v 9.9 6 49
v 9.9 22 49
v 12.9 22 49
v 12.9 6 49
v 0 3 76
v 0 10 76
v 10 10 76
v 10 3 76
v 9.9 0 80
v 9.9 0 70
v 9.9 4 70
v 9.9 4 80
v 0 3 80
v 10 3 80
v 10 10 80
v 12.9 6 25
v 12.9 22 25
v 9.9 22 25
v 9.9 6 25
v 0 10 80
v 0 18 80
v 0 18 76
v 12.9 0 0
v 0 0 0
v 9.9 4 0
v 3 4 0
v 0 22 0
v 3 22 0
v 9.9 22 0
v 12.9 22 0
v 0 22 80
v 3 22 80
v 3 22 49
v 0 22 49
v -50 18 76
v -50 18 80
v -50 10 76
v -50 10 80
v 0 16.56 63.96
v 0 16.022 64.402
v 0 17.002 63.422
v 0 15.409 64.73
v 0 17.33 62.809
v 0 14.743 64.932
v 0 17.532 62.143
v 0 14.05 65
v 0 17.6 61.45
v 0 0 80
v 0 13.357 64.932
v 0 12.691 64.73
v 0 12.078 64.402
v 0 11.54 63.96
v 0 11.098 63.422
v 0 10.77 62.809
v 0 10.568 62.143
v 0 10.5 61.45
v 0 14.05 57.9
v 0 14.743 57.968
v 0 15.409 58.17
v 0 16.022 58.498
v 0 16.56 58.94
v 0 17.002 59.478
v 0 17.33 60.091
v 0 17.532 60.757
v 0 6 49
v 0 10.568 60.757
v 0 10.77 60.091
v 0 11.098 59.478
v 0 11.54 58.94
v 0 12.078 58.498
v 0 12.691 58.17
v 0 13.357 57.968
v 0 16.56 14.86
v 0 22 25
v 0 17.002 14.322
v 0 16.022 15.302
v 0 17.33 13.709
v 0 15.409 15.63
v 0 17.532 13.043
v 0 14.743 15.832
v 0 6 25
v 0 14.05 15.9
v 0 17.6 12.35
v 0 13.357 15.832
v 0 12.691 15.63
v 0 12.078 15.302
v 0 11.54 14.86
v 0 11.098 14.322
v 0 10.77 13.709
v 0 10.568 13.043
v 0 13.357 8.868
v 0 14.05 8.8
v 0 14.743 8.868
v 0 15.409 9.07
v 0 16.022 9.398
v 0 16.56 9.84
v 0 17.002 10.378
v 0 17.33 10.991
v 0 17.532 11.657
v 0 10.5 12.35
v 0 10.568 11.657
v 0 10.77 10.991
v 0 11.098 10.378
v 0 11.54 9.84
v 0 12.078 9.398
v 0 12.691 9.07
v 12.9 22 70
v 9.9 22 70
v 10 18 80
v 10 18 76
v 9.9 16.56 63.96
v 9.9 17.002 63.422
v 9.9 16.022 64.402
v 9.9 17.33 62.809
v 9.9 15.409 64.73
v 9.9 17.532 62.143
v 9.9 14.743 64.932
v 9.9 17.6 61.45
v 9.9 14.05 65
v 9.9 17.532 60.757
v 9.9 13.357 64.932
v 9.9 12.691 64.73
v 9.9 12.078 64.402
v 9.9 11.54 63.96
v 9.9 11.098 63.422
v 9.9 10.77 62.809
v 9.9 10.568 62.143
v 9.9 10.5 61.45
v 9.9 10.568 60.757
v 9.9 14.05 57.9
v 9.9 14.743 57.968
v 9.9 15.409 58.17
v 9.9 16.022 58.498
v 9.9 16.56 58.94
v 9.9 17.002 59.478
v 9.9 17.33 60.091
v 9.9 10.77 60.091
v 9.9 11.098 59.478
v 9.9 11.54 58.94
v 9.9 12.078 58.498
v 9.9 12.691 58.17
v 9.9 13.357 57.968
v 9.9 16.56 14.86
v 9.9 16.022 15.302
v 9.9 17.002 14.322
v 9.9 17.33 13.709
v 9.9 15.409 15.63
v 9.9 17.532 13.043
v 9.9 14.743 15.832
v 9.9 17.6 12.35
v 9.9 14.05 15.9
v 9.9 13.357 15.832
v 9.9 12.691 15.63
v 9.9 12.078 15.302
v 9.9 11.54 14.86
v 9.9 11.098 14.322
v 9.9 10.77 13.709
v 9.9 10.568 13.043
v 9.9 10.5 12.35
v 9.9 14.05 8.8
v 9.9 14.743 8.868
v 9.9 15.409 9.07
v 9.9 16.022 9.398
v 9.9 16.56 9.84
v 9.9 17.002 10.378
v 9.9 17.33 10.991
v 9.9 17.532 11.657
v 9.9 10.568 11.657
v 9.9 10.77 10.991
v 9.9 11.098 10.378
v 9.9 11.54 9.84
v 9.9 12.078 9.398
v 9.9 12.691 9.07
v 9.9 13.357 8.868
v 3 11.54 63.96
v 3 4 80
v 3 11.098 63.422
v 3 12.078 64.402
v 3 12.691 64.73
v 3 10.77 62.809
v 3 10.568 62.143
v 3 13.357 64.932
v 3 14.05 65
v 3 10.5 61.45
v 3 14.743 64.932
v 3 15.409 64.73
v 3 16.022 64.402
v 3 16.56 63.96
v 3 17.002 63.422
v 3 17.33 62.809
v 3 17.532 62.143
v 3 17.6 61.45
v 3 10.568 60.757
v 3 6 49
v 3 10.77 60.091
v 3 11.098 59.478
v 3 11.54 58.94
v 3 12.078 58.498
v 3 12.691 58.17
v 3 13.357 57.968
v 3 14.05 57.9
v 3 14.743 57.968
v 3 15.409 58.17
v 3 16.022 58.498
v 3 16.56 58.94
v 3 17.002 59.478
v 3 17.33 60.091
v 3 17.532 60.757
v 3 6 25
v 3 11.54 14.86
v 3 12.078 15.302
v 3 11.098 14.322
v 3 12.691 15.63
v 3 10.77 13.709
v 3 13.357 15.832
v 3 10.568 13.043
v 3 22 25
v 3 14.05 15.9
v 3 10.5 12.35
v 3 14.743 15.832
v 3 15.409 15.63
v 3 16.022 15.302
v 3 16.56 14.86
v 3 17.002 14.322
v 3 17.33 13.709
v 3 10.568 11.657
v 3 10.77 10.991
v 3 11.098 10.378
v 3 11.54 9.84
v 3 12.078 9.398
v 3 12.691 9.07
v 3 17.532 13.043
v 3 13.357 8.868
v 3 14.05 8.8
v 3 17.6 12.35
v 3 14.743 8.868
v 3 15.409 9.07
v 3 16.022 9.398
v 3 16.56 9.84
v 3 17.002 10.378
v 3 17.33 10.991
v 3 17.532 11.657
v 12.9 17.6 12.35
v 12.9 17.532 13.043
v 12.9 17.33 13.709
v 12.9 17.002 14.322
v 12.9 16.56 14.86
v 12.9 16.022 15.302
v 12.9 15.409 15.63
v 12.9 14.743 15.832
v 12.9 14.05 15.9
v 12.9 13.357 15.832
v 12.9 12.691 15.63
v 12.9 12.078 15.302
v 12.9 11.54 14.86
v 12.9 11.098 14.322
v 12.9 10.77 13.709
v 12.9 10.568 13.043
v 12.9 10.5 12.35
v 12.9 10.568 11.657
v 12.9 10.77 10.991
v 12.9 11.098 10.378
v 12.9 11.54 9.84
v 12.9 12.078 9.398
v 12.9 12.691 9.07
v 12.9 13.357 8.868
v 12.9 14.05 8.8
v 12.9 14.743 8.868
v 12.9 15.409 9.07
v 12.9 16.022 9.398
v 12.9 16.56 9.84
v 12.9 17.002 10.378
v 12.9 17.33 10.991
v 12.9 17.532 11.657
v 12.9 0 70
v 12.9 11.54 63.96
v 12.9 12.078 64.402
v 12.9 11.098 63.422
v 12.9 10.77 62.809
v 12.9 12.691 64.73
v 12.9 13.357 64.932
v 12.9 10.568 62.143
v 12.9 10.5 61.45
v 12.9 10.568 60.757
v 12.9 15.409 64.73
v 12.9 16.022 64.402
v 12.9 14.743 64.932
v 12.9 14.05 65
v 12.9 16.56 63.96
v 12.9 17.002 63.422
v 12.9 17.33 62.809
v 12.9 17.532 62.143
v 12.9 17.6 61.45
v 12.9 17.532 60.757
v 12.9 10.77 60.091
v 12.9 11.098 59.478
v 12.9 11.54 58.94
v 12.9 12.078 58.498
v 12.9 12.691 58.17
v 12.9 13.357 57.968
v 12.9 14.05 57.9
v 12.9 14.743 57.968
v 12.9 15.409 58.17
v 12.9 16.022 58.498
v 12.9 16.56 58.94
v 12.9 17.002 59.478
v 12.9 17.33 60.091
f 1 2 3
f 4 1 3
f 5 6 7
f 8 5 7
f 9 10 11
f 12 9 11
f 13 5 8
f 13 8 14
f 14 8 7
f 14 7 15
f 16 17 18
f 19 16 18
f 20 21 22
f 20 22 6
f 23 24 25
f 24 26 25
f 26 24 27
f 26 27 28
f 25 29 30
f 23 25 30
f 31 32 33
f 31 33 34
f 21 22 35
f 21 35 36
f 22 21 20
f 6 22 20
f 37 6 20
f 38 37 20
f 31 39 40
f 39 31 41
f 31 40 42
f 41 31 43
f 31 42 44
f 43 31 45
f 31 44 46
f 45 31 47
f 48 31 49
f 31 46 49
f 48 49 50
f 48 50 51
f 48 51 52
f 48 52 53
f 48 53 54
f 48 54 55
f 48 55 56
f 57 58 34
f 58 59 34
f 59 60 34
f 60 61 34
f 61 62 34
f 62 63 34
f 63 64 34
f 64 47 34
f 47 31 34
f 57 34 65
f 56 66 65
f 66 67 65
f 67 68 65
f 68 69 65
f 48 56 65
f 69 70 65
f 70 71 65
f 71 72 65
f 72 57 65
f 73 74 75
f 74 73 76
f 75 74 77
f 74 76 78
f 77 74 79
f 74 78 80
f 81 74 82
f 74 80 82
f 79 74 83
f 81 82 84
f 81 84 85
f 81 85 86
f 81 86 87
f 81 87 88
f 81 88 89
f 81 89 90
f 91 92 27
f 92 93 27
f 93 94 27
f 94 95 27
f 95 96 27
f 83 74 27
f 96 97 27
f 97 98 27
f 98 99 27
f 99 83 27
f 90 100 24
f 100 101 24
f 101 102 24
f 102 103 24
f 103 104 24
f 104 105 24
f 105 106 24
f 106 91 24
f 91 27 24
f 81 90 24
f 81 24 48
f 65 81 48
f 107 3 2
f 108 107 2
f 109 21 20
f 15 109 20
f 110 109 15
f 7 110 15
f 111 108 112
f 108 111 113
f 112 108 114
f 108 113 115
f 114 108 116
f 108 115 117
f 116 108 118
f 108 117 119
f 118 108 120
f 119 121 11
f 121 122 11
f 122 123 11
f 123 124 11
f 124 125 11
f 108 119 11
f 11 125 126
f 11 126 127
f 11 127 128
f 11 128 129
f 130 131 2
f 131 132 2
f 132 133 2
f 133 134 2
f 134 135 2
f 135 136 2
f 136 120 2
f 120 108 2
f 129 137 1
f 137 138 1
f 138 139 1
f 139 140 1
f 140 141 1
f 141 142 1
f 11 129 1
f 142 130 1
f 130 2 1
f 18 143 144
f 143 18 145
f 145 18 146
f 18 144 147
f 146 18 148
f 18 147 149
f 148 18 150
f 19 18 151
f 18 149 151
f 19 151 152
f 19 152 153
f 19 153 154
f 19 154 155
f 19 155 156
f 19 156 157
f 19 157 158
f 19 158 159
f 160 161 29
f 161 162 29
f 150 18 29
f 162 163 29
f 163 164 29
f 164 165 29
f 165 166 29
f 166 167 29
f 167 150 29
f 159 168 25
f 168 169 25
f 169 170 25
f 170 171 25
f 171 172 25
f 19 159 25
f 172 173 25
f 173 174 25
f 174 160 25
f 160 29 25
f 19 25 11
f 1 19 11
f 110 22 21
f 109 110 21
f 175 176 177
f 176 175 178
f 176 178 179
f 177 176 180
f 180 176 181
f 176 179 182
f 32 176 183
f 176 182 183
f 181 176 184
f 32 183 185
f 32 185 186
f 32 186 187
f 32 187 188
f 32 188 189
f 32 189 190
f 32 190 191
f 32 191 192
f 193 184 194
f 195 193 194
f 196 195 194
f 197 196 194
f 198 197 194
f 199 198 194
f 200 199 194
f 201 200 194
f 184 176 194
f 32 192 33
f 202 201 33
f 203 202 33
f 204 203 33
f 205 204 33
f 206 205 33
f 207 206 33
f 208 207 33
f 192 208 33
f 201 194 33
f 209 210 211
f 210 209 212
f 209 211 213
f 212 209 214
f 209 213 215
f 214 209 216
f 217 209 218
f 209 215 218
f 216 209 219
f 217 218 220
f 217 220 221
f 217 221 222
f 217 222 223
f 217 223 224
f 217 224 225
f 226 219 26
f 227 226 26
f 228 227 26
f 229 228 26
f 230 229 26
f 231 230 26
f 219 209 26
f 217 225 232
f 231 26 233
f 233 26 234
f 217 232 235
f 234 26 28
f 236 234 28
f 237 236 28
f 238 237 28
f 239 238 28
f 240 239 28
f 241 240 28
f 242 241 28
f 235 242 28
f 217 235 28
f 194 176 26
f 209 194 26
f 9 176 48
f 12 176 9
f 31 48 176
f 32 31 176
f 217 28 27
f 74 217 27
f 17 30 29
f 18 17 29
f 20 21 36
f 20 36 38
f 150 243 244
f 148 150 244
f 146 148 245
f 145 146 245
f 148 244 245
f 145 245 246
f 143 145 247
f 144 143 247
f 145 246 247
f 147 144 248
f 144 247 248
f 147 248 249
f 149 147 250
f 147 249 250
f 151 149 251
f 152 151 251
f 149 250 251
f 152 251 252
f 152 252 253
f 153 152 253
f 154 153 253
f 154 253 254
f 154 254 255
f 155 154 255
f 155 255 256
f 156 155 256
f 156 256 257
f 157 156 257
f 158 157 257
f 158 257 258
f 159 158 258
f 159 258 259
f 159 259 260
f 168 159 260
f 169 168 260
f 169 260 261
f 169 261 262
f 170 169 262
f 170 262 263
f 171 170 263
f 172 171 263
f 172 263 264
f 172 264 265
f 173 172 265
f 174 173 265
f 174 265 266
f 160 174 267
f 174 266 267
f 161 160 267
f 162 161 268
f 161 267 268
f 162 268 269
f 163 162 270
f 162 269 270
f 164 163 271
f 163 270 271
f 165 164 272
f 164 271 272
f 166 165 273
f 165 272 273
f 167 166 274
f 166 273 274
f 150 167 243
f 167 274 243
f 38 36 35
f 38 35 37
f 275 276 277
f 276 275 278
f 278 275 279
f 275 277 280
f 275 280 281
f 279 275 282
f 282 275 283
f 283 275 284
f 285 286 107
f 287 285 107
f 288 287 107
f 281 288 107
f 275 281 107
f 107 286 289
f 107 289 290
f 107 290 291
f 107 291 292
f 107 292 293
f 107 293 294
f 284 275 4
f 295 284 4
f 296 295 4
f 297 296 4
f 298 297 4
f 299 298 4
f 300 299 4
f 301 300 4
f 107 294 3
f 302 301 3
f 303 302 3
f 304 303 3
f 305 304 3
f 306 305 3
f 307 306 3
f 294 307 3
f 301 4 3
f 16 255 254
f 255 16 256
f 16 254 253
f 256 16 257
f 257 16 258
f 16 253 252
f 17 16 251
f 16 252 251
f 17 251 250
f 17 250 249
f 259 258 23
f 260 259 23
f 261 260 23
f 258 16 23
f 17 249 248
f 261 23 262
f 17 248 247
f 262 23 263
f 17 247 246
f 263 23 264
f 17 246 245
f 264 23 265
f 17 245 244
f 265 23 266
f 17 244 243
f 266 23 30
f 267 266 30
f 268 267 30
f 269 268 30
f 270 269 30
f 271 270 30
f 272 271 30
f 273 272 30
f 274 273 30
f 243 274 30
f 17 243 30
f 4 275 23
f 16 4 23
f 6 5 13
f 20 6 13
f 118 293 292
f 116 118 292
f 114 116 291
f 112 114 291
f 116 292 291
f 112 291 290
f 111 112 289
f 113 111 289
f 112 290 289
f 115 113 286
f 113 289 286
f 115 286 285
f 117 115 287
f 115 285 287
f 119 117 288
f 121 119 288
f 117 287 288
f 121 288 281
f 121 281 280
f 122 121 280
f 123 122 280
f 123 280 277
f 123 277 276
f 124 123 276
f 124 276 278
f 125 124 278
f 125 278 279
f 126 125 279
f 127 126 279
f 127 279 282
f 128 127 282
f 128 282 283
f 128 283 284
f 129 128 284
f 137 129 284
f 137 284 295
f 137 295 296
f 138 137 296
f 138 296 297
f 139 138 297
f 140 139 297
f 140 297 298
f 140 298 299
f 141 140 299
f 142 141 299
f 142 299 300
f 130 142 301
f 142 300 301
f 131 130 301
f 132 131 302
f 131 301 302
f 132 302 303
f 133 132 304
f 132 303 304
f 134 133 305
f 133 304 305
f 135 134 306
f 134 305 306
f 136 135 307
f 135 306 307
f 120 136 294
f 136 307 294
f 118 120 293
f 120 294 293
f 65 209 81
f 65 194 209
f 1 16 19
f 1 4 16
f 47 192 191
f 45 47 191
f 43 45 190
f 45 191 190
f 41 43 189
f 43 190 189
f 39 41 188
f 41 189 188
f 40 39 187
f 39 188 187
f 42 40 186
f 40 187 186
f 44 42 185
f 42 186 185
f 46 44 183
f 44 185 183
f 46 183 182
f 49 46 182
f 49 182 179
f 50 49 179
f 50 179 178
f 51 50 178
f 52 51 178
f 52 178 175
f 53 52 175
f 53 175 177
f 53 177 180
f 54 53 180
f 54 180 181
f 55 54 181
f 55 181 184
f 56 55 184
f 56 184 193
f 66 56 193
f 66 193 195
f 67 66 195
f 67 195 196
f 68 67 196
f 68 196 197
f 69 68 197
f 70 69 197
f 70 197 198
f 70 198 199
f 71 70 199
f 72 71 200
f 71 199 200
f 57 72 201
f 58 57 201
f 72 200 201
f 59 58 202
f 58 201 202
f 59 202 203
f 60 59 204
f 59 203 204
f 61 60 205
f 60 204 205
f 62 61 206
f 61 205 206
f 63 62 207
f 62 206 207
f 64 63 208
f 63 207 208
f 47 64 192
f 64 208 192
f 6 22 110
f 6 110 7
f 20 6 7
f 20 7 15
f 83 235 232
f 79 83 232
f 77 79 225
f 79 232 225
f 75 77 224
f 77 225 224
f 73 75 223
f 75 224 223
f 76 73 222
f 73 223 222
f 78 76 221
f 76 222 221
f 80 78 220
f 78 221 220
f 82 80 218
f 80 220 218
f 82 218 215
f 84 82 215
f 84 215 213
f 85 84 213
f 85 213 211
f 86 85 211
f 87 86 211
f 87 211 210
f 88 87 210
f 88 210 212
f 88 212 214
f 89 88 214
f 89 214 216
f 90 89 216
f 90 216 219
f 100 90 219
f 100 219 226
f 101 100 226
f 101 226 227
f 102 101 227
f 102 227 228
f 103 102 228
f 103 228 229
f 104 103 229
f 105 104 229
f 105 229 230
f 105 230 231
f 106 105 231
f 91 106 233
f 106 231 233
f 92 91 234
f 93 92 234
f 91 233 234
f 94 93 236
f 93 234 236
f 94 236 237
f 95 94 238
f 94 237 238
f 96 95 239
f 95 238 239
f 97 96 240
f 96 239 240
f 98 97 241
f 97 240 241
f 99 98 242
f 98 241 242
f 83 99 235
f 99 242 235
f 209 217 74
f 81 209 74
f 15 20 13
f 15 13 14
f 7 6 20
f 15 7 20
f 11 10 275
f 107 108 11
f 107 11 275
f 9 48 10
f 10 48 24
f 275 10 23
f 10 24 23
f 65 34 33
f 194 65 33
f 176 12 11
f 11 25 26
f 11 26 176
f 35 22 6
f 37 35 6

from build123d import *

# Parameters (mm, degrees)
F1_DEPTH  = 70
F2_R      = 3.55
F3_DEPTH  = 12.901
F5_DEPTH  = 10
F6_W      = 8
F6_H      = 4
F7_DEPTH  = 50
F8_W      = 9.9
F8_H      = 24
F8_W_2    = 3
F9_DEPTH  = 16
F10_DEPTH = 10
F11_DEPTH = 7


# Not quite as in the source:
# - a feature names something its author has since deleted; it is built from what else it names


with BuildPart() as f1:
    # F0 (on Top) → F1 (new body)
    with BuildSketch(Plane.XY):
        Polygon((0, 22), (0, 0), (12.9, 0), (12.9, 22), (9.9, 22), (9.9, 4), (3, 4), (3, 22), align=None)
    extrude(amount=F1_DEPTH)

    # F2 (on face) → F3 (cut, through all)
    with BuildSketch(Plane.YZ.offset(12.9)):
        with Locations((14.05, 61.45)):
            Circle(F2_R)
        with Locations((14.05, 12.35)):
            Circle(F2_R)
    extrude(amount=-F3_DEPTH, mode=Mode.SUBTRACT)

    # F4 (on face) → F5 (join)
    with BuildSketch(Plane.XY.offset(70)):
        Polygon((9.9, 0), (9.9, 4), (3, 4), (3, 22), (0, 22), (0, 0), align=None)
    extrude(amount=F5_DEPTH)

    # F8 (on face) → F9 (cut)
    with BuildSketch(Plane(origin=(0, 22, 0), x_dir=(-1, 0, 0), z_dir=(0, 1, 0))):
        with Locations((-4.95, 37)):
            Rectangle(F8_W, F8_H)
        with Locations((-11.4, 37)):
            Rectangle(F8_W_2, F8_H)
    extrude(amount=-F9_DEPTH, mode=Mode.SUBTRACT)


with BuildPart() as f7:
    # F6 (on face) → F7 (new body)
    with BuildSketch(Plane(origin=(0, 0, 0), x_dir=(0, -1, 0), z_dir=(-1, 0, 0))):
        with Locations((-14, 78)):
            Rectangle(F6_W, F6_H)
    extrude(amount=F7_DEPTH)


with BuildPart() as f10:
    # F6 (on face) → F10 (new body)
    with BuildSketch(Plane(origin=(0, 0, 0), x_dir=(0, -1, 0), z_dir=(-1, 0, 0))):
        with Locations((-14, 78)):
            Rectangle(F6_W, F6_H)
    extrude(amount=-F10_DEPTH)


with BuildPart() as f11:
    # F11 (new): a face of the model
    f11_faces = [f10.part.faces().sort_by_distance(p)[0] for p in [
        (5, 10, 78),
    ]]
    extrude(f11_faces, amount=F11_DEPTH)


solid = Compound([f1.part, f7.part, f10.part, f11.part])
